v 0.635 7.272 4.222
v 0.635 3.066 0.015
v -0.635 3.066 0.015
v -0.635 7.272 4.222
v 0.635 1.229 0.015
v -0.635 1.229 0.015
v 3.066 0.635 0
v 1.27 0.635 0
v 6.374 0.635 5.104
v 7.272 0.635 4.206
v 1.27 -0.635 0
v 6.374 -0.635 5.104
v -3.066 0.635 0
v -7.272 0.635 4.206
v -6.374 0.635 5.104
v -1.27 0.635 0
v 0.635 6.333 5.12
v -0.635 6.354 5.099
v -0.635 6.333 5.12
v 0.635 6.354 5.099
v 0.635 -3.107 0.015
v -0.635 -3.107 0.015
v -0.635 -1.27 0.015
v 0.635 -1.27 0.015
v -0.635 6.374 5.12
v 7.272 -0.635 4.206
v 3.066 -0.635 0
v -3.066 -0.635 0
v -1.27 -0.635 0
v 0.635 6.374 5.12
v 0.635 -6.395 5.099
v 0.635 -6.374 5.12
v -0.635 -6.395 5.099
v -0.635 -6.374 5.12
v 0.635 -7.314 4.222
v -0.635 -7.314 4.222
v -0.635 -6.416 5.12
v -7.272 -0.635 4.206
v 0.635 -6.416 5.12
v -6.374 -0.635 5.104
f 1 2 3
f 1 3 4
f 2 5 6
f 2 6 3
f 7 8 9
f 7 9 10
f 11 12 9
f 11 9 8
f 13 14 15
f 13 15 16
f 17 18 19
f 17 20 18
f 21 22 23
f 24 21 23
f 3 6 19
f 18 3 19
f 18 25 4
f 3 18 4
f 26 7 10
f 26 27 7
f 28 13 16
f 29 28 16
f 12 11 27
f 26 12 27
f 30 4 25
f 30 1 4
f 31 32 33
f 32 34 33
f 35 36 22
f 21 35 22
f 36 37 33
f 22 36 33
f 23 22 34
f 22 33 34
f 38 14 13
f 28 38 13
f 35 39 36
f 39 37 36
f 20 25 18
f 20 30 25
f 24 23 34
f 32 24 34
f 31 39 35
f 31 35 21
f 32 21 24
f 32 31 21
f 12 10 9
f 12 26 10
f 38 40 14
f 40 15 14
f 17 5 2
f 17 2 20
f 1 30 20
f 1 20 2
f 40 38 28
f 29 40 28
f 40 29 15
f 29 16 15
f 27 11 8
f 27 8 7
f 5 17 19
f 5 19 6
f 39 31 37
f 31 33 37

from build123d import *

# Parameters (mm, degrees)
F1_DEPTH = 0.635
F3_DEPTH = 0.635


with BuildPart() as f1:
    # F0 (on Front) → F1 (new body, symmetric)
    with BuildSketch(Plane.XZ):
        Polygon((-3.066051, 0), (-1.27, 0), (-6.374387, 5.104387), (-7.272413, 4.206362), align=None)
        Polygon((7.272413, 4.206362), (6.374387, 5.104387), (1.27, 0), (3.066051, 0), align=None)
    extrude(amount=F1_DEPTH, both=True)


with BuildPart() as f3:
    # F2 (on Right) → F3 (new body, symmetric)
    with BuildSketch(Plane.YZ):
        Polygon((-3.066051, 0.015338), (-1.311318, 0.015338), (-6.395046, 5.099066), (-7.272413, 4.2217), align=None)
        Polygon((-6.395046, 5.099066), (-1.311318, 0.015338), (-1.27, 0.015338), (-6.374387, 5.119725), align=None)
        Polygon((-7.272413, 4.2217), (-6.395046, 5.099066), (-6.415706, 5.119725), (-7.313731, 4.2217), (-3.10737, 0.015338), (-3.066051, 0.015338), align=None)
        Polygon((6.353728, 5.099066), (6.333069, 5.119725), (1.228682, 0.015338), (1.27, 0.015338), align=None)
        Polygon((6.374387, 5.119725), (6.353728, 5.099066), (7.231094, 4.2217), (3.024733, 0.015338), (3.066051, 0.015338), (7.272413, 4.2217), align=None)
        Polygon((7.231094, 4.2217), (6.353728, 5.099066), (1.27, 0.015338), (3.024733, 0.015338), align=None)
    extrude(amount=F3_DEPTH, both=True)


solid = Compound([f1.part, f3.part])
